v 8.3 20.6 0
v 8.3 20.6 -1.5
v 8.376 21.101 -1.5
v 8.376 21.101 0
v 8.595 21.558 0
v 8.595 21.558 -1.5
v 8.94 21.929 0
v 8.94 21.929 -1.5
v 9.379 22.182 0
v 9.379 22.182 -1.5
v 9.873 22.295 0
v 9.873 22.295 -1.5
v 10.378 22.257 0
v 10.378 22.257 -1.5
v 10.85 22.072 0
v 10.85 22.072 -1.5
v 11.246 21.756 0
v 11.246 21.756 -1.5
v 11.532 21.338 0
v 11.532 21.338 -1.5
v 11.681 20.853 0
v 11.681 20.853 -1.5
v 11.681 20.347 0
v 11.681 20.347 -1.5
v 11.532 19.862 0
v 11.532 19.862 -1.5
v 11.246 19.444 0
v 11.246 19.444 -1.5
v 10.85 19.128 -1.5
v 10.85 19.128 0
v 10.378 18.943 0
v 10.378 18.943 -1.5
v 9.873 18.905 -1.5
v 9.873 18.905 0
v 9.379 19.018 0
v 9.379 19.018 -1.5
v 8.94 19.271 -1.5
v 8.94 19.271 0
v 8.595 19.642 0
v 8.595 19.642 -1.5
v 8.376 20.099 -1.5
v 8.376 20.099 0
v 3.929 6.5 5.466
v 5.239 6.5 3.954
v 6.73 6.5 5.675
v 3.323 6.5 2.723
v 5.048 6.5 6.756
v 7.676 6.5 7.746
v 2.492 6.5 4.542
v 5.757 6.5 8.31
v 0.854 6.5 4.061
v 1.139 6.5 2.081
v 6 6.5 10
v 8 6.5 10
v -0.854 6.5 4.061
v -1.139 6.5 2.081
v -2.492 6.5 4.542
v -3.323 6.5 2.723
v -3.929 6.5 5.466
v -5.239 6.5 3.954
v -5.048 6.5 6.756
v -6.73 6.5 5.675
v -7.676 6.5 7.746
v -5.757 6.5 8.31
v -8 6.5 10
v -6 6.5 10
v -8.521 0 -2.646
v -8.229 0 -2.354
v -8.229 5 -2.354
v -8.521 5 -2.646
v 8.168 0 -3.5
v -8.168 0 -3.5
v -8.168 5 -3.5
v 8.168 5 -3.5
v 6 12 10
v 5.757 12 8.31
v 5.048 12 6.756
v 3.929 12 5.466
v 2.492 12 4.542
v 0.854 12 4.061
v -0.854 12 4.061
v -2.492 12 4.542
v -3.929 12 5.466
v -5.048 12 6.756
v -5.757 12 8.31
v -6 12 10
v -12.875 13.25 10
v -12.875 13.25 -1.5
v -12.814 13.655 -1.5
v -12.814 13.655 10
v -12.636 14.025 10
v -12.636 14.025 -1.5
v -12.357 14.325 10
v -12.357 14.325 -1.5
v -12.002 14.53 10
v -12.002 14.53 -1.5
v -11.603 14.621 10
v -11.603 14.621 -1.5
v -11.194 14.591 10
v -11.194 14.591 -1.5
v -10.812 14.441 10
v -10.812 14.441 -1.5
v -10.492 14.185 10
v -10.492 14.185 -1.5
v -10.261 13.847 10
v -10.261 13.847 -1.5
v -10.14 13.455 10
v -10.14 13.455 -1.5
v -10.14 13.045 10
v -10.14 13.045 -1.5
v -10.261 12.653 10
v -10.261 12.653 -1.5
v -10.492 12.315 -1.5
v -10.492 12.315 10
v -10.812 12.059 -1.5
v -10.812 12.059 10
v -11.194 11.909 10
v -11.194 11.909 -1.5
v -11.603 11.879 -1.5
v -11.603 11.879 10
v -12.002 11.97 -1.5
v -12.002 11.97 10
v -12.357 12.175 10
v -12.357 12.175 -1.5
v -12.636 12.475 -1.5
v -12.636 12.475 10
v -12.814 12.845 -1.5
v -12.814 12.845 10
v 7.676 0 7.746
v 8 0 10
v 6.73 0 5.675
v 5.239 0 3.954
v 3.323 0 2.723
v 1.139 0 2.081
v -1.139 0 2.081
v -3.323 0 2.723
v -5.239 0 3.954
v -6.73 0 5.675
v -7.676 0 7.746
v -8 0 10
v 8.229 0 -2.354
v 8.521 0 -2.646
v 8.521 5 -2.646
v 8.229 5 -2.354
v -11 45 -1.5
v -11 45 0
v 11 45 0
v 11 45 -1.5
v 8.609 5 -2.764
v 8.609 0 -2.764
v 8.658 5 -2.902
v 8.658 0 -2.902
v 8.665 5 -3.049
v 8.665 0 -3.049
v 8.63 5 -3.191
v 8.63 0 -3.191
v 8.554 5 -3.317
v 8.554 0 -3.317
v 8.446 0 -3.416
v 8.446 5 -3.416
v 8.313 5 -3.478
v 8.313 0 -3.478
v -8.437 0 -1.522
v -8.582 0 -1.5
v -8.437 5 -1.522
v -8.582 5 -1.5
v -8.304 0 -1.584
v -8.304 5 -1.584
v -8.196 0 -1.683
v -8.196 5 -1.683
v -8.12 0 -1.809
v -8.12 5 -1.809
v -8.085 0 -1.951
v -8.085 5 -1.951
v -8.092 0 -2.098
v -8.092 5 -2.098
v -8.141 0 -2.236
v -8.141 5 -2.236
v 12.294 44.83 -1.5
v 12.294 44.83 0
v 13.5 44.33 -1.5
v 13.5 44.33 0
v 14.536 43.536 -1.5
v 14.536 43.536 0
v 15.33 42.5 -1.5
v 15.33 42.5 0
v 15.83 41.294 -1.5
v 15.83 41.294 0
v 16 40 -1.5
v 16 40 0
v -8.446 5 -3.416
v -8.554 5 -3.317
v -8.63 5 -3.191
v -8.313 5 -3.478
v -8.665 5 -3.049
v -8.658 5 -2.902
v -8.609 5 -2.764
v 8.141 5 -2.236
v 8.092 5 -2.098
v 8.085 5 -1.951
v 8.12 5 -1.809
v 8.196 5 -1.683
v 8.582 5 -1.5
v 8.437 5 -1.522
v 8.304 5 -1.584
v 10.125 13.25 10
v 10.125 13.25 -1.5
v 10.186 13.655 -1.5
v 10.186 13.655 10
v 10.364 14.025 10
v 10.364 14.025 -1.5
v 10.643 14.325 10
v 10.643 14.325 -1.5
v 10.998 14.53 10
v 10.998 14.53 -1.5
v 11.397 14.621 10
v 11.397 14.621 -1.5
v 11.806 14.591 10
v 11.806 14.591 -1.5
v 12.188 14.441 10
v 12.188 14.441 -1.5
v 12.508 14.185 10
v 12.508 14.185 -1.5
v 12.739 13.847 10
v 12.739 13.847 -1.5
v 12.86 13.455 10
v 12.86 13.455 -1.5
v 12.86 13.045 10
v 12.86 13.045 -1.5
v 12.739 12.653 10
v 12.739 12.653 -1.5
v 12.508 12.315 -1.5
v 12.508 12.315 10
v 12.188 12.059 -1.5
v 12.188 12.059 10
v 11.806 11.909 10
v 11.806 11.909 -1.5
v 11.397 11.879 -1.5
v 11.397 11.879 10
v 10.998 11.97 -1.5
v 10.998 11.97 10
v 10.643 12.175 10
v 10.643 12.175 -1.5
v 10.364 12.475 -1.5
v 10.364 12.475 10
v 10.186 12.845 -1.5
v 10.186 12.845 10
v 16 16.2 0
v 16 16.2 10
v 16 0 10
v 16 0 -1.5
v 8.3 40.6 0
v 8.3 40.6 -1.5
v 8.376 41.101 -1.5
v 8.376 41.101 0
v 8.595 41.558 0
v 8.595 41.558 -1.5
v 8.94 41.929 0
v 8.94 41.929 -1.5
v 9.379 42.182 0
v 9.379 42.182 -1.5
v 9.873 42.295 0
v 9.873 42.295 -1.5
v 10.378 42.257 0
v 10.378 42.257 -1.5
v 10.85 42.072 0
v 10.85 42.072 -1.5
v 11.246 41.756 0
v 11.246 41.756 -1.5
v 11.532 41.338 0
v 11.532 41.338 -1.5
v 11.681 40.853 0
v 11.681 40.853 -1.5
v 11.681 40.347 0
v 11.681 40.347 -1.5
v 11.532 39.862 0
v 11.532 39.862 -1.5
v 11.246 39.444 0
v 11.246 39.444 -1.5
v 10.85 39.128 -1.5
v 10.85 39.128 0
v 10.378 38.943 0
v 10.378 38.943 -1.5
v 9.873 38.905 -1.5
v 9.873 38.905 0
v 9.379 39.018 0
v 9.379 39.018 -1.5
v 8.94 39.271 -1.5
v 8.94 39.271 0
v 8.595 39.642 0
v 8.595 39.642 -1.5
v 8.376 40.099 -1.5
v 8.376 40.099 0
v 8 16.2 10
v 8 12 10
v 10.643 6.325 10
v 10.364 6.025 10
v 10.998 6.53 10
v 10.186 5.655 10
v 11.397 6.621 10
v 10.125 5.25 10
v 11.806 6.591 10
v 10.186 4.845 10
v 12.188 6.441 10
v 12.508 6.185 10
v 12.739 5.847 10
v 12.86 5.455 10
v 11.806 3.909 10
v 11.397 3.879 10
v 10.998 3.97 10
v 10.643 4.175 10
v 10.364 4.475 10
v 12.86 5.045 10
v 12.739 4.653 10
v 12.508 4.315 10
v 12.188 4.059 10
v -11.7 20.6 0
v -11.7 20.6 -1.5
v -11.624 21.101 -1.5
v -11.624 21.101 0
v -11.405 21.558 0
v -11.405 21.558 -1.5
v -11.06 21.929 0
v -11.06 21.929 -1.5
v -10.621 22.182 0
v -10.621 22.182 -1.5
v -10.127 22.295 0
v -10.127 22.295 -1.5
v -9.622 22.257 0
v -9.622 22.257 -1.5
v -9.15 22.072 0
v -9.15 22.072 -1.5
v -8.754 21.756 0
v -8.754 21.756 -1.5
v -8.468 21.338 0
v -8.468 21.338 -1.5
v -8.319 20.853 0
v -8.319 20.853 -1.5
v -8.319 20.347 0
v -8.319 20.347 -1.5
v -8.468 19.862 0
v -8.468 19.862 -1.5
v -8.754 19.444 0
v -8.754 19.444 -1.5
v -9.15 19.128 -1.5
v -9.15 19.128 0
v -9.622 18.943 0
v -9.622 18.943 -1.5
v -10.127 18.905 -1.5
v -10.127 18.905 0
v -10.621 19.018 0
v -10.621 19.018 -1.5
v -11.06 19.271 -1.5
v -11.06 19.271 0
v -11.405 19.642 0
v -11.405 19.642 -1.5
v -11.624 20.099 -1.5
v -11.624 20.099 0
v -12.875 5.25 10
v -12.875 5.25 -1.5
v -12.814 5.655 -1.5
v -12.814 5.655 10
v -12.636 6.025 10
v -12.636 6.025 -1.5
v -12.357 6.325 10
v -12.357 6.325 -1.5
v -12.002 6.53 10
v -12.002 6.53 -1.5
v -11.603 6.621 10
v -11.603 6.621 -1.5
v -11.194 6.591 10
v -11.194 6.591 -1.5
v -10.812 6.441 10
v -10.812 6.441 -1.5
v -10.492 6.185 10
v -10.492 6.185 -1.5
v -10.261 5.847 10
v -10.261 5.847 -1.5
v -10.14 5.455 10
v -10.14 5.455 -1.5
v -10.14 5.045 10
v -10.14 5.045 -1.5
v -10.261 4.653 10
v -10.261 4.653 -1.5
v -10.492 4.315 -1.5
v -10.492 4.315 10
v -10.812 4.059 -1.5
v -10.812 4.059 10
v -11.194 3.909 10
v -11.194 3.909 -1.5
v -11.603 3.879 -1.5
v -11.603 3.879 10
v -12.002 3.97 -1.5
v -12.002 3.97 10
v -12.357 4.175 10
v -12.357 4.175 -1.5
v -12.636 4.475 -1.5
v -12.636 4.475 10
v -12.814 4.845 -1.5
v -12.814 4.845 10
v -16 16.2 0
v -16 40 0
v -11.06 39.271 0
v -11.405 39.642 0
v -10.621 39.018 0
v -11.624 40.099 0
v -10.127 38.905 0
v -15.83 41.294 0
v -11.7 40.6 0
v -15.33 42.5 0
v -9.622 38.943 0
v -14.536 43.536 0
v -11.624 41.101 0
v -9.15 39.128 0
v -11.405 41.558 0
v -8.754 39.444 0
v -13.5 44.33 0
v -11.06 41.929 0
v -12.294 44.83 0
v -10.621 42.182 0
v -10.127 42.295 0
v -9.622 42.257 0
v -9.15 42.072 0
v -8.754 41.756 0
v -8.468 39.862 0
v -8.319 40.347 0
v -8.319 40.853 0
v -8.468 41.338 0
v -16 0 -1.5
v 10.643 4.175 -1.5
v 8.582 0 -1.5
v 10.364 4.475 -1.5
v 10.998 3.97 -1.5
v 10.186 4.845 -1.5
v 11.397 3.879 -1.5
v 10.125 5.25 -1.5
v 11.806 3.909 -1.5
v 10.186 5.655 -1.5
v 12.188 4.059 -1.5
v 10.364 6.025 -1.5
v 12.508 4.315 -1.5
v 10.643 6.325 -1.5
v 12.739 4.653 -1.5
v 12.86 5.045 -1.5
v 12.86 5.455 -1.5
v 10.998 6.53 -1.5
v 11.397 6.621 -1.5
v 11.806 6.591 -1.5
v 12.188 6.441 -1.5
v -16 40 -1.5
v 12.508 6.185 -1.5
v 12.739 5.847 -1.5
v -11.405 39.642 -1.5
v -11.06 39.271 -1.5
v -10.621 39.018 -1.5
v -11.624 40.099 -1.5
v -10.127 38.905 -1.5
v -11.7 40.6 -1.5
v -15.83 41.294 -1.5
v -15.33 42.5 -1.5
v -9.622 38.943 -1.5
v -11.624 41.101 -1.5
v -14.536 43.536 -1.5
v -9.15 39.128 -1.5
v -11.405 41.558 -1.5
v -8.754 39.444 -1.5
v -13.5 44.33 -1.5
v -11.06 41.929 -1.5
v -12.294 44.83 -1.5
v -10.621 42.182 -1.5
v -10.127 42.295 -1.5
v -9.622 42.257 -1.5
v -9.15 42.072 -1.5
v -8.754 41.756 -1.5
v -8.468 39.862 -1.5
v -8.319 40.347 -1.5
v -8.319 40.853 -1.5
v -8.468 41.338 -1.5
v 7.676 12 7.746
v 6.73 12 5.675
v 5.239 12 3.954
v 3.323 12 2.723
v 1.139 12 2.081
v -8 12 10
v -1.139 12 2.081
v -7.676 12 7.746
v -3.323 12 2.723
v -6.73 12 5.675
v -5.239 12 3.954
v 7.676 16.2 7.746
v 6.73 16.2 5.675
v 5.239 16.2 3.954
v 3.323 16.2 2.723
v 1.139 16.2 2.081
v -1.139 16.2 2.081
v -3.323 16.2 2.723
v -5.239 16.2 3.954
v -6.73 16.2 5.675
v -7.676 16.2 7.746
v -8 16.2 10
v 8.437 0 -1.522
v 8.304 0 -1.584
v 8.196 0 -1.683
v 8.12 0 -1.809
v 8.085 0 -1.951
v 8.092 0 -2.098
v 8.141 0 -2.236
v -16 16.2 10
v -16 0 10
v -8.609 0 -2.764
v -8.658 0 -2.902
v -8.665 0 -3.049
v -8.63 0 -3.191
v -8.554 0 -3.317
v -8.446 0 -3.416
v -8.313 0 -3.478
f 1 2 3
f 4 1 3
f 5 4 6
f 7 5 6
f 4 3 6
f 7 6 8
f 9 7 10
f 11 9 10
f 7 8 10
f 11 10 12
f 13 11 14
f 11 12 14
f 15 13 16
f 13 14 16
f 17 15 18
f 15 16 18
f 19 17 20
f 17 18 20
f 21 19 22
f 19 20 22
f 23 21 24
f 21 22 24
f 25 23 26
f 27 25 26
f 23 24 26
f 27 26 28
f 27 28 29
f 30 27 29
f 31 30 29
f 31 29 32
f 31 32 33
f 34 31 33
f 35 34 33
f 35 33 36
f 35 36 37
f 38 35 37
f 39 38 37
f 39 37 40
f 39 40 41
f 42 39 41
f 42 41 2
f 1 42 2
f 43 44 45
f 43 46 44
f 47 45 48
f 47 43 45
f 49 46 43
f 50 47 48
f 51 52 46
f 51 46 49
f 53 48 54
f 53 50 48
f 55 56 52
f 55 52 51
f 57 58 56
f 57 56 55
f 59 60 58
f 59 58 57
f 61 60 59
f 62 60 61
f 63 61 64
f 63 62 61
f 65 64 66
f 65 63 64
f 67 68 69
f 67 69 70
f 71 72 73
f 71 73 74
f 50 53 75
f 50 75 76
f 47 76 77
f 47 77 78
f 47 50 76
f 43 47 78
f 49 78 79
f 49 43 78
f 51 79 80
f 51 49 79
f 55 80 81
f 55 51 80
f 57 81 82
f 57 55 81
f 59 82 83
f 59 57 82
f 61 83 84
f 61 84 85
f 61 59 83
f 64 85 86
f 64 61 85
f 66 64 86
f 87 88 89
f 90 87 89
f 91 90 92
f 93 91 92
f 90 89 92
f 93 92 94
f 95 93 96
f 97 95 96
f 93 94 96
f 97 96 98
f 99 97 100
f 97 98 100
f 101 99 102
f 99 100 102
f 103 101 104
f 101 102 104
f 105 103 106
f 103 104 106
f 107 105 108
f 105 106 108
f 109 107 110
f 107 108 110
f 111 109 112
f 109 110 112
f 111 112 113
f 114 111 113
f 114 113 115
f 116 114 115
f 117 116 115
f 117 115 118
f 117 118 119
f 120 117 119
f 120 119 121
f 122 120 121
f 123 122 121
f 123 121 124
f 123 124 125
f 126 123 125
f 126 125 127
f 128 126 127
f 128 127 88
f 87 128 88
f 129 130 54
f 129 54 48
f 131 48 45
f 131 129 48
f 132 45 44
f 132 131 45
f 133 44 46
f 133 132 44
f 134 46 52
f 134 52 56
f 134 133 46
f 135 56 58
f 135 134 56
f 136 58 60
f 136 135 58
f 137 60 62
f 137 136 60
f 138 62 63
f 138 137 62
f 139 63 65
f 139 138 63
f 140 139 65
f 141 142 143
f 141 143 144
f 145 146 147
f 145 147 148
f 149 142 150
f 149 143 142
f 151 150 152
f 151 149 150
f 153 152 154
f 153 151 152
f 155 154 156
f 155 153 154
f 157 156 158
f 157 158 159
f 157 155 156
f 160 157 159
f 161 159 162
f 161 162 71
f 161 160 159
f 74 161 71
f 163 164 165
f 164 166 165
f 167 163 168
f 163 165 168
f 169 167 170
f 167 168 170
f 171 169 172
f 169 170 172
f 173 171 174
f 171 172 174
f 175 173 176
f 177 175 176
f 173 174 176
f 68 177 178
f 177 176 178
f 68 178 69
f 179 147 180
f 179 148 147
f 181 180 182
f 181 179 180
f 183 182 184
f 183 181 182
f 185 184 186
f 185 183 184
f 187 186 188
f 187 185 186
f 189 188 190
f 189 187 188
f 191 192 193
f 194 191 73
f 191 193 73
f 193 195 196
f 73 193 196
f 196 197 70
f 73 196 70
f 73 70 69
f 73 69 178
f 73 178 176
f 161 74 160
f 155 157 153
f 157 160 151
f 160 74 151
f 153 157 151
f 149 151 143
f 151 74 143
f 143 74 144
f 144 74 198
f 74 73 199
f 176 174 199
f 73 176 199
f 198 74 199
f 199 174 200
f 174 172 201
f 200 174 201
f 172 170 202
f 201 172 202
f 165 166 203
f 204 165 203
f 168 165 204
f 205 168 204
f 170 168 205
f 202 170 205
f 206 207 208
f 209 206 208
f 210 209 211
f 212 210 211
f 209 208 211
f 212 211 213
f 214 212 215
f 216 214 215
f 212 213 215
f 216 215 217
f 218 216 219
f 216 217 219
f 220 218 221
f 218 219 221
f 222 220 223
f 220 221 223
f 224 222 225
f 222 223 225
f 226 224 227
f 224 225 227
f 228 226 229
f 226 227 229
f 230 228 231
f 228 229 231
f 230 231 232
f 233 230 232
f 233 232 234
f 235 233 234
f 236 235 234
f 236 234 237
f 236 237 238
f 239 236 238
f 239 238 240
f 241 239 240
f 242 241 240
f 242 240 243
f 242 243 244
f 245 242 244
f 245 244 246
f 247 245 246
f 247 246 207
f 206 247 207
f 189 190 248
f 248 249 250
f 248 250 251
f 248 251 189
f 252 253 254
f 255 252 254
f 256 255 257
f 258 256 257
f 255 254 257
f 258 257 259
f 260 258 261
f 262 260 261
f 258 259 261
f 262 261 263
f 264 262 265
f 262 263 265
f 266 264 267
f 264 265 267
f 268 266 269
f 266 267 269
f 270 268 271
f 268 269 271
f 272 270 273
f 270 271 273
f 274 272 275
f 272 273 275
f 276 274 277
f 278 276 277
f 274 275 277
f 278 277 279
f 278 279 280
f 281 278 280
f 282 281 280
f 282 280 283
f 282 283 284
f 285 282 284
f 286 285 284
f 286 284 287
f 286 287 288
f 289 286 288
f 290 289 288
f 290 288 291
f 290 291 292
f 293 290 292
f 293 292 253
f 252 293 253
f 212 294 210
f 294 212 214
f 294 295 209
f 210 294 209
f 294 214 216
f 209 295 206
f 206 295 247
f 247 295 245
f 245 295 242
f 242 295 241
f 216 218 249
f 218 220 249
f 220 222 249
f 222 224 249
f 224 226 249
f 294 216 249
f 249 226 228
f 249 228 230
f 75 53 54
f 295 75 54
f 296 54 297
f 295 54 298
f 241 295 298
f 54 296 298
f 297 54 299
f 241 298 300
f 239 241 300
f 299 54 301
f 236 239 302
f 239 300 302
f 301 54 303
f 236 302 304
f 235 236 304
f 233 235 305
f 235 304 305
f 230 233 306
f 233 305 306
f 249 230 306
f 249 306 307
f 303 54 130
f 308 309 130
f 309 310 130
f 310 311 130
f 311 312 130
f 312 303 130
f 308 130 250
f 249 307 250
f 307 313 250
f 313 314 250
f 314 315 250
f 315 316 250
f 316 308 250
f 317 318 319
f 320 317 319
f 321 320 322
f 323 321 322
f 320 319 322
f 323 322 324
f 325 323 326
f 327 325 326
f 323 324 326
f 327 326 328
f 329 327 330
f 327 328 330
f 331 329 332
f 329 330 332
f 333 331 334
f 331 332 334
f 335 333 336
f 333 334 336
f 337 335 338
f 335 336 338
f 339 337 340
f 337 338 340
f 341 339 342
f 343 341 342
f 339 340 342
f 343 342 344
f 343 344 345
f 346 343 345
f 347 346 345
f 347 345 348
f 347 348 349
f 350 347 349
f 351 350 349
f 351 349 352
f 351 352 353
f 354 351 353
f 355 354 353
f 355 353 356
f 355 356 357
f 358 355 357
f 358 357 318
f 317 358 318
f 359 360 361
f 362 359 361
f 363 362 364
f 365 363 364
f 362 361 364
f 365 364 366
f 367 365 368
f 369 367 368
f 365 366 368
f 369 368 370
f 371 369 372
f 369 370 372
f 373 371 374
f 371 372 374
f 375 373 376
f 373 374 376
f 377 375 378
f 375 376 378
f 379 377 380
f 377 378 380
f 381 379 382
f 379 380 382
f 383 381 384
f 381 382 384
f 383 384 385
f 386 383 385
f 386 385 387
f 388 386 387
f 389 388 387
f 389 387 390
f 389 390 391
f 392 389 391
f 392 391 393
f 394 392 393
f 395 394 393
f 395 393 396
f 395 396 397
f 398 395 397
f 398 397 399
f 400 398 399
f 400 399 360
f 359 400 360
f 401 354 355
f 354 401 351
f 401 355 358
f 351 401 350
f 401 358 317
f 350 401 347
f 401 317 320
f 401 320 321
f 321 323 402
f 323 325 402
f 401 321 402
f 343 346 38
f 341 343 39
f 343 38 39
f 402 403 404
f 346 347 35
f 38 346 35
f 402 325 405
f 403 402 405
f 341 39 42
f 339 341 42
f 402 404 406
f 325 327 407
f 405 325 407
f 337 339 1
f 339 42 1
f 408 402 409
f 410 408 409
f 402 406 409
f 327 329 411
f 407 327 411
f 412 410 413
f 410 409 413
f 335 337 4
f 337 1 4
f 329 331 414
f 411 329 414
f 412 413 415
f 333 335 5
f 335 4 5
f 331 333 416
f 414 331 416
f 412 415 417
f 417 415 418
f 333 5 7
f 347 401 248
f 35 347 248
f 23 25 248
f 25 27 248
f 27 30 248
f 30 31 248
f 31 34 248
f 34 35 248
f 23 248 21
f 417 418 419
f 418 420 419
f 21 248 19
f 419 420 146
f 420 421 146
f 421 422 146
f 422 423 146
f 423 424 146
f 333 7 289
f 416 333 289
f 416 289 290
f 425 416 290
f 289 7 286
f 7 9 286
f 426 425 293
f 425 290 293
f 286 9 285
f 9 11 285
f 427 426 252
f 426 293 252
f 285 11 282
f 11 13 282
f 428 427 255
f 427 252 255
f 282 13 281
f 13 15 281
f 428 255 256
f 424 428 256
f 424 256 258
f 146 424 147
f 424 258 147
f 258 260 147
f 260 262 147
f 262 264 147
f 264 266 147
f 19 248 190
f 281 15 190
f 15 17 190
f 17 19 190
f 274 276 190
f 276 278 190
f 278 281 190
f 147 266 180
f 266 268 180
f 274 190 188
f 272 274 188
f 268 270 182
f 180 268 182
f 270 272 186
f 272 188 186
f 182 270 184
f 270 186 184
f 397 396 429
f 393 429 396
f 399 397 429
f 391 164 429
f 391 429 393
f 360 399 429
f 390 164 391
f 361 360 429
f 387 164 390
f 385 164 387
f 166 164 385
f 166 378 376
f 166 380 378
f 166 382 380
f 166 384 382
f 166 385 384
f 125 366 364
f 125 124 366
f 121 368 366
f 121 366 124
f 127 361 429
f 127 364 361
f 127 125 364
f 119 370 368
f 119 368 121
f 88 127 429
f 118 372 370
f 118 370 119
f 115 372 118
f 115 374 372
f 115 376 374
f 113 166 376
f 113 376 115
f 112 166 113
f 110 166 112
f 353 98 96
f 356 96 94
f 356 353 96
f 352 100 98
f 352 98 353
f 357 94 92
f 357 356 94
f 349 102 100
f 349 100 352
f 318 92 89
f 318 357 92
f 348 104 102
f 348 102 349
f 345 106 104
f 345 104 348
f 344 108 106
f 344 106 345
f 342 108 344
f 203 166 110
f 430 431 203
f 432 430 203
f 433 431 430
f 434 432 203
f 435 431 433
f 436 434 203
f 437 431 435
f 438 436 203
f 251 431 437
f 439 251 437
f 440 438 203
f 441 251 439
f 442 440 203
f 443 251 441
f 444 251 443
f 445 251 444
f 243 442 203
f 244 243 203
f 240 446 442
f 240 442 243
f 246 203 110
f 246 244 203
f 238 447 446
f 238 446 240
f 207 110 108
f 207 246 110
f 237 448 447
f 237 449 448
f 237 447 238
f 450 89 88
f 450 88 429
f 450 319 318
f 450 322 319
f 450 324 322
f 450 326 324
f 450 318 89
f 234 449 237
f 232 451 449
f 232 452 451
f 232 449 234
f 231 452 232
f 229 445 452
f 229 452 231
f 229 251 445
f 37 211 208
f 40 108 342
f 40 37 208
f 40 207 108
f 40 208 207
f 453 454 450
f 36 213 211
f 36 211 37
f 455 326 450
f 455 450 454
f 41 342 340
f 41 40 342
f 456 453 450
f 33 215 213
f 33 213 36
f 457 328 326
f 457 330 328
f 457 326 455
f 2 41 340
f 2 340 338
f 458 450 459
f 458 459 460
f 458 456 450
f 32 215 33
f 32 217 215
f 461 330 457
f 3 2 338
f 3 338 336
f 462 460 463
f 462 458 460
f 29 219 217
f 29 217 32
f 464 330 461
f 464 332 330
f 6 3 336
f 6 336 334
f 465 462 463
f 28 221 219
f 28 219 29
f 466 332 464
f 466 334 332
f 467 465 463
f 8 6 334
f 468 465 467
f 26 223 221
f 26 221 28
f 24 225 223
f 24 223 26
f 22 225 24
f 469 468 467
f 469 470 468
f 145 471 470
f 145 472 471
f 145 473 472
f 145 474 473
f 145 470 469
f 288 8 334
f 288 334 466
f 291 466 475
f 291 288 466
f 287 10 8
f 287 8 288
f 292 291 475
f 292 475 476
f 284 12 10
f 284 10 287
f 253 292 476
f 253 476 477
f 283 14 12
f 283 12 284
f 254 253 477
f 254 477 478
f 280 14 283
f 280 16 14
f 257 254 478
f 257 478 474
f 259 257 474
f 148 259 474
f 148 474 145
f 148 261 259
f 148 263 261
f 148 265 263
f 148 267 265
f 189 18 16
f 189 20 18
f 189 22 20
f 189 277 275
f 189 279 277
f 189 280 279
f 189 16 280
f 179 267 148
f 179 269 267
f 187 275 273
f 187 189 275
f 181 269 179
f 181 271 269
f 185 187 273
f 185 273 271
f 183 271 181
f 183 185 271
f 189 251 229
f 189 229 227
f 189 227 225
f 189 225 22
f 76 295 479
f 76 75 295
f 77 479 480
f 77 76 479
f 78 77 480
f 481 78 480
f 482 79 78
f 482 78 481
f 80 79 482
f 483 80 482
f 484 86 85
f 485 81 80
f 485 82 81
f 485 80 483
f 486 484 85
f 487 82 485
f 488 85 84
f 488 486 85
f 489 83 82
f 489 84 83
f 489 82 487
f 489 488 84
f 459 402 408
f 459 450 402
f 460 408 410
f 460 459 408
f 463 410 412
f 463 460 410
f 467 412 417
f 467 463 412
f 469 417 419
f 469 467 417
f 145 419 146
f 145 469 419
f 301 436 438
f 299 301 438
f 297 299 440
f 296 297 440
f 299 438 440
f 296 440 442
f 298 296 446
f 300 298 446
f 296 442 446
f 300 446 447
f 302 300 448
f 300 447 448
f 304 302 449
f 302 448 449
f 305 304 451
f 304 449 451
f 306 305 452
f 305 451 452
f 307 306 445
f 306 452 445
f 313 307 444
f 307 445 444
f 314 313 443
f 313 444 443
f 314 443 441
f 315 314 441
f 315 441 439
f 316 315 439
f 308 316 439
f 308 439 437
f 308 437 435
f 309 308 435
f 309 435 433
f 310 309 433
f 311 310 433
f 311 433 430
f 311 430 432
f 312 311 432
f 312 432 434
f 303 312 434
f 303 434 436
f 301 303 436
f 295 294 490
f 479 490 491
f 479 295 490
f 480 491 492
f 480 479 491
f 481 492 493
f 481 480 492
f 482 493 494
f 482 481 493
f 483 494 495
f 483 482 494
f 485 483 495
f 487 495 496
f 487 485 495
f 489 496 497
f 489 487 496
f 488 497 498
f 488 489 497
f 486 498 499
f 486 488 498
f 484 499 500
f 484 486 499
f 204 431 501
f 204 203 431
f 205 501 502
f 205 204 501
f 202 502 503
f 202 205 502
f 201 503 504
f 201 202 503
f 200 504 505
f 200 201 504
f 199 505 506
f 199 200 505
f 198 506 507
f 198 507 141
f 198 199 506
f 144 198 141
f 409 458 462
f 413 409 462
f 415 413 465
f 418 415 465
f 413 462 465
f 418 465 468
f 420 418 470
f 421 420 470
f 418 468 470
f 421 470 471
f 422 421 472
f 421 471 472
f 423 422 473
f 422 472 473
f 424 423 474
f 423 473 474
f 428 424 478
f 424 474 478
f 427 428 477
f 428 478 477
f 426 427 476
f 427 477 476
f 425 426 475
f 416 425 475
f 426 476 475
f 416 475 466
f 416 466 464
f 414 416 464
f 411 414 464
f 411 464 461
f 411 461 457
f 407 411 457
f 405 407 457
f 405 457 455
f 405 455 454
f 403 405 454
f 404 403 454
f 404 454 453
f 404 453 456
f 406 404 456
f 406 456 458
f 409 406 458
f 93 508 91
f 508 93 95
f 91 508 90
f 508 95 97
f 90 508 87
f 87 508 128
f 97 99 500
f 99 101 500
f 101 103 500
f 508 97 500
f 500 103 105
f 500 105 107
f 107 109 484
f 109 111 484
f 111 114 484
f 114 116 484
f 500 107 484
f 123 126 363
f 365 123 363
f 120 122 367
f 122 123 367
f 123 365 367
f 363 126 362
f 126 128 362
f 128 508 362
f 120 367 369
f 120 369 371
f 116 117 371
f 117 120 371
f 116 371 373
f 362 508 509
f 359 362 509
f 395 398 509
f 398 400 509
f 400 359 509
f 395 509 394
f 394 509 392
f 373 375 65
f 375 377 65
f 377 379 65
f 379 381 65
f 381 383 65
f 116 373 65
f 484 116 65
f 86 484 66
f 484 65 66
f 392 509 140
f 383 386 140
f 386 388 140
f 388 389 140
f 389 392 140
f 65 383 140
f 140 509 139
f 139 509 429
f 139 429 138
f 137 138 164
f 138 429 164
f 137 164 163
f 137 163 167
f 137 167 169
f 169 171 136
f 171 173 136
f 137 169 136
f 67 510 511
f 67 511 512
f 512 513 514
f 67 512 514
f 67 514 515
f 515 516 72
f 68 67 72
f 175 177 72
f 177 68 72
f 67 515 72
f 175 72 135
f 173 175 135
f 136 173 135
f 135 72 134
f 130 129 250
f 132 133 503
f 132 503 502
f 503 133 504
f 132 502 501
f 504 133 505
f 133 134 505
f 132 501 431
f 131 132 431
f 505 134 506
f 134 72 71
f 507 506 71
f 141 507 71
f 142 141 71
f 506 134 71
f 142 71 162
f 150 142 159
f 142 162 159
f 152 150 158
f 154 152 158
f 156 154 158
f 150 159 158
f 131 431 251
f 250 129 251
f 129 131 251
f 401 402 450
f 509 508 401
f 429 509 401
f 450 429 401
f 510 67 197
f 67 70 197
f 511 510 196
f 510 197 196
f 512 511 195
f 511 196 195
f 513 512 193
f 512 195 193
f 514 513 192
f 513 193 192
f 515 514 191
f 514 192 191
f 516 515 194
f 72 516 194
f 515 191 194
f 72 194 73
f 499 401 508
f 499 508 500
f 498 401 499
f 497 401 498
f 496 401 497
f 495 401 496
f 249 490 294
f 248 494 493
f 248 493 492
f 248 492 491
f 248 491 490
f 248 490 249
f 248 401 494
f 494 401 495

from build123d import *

# Parameters (mm, degrees)
SKETCH1_W                 = 1.5
SKETCH1_H                 = 45
BOSS_EXTRUDE1_DEPTH       = 16
SKETCH2_W                 = 32
SKETCH2_H                 = 10
BOSS_EXTRUDE2_DEPTH       = 16.2
M3X0_5_TAPPED_HOLE1_D     = 2.75
M3X0_5_TAPPED_HOLE1_DEPTH = 12
M3X0_5_TAPPED_HOLE1_TIP   = 0.826183351
BOSS_EXTRUDE3_DEPTH       = 5
FILLET1_R                 = 0.5
M3_CLEARANCE_HOLE1_D      = 3.4
FILLET2_R                 = 5


with BuildPart() as part:
    # Sketch1 → Boss-Extrude1 (new body, symmetric)
    with BuildSketch(Plane(origin=(0, 0, 0), x_dir=(0, 0, -1), z_dir=(1, 0, 0))):
        with Locations((0.75, 22.5)):
            Rectangle(SKETCH1_W, SKETCH1_H)
    extrude(amount=BOSS_EXTRUDE1_DEPTH, both=True)

    # Sketch2 → Boss-Extrude2 (add)
    with BuildSketch(Plane(origin=(0, 0, 0), x_dir=(1, 0, 0), z_dir=(0, 1, 0))):
        with Locations((0, -5)):
            Rectangle(SKETCH2_W, SKETCH2_H)
    extrude(amount=BOSS_EXTRUDE2_DEPTH)

    # Sketch9 → Cut-Revolve1 (revolve, cut)
    with BuildSketch(Plane(origin=(0, 0, 0), x_dir=(0, 0, -1), z_dir=(1, 0, 0))):
        Polygon((-10, 16.2), (-2, 16.2), (-2, 12), (-4, 12), (-4, 6.5), (-2, 6.5), (-2, 0), (-10, 0), align=None)
    revolve(axis=Axis((0, 0, 10), (0, 1, 0)), mode=Mode.SUBTRACT)

    # M3x0.5 Tapped Hole1
    with Locations(Plane.XY.offset(10)):
        with Locations((-11.5, 13.25), (11.5, 13.25), (-11.5, 5.25), (11.5, 5.25)):
            Hole(M3X0_5_TAPPED_HOLE1_D / 2, depth=M3X0_5_TAPPED_HOLE1_DEPTH)
            with Locations((0, 0, -(M3X0_5_TAPPED_HOLE1_DEPTH + M3X0_5_TAPPED_HOLE1_TIP / 2))):  # 118° drill point
                Cone(0, M3X0_5_TAPPED_HOLE1_D / 2, M3X0_5_TAPPED_HOLE1_TIP, mode=Mode.SUBTRACT)

    # Sketch13 → Boss-Extrude3 (add)
    with BuildSketch(Plane.XZ):
        Polygon((-7.375, -1.5), (-9.375, -3.5), (9.375, -3.5), (7.375, -1.5), align=None)
    extrude(amount=-BOSS_EXTRUDE3_DEPTH)

    # Fillet1
    fillet1_edges = [part.edges().sort_by_distance(p)[0] for p in [
        (-7.375, 2.5, -1.5),
        (7.375, 2.5, -1.5),
        (9.375, 2.5, -3.5),
        (-9.375, 2.5, -3.5),
    ]]
    fillet(fillet1_edges, radius=FILLET1_R)

    # M3 Clearance Hole1 (through all)
    with Locations(Plane.XY):
        with Locations((-10, 20.6), (-10, 40.6), (10, 40.6), (10, 20.6)):
            Hole(M3_CLEARANCE_HOLE1_D / 2)

    # Fillet2
    fillet2_edges = [part.edges().sort_by_distance(p)[0] for p in [
        (16, 45, -0.75),
        (-16, 45, -0.75),
    ]]
    fillet(fillet2_edges, radius=FILLET2_R)


solid = part.part
